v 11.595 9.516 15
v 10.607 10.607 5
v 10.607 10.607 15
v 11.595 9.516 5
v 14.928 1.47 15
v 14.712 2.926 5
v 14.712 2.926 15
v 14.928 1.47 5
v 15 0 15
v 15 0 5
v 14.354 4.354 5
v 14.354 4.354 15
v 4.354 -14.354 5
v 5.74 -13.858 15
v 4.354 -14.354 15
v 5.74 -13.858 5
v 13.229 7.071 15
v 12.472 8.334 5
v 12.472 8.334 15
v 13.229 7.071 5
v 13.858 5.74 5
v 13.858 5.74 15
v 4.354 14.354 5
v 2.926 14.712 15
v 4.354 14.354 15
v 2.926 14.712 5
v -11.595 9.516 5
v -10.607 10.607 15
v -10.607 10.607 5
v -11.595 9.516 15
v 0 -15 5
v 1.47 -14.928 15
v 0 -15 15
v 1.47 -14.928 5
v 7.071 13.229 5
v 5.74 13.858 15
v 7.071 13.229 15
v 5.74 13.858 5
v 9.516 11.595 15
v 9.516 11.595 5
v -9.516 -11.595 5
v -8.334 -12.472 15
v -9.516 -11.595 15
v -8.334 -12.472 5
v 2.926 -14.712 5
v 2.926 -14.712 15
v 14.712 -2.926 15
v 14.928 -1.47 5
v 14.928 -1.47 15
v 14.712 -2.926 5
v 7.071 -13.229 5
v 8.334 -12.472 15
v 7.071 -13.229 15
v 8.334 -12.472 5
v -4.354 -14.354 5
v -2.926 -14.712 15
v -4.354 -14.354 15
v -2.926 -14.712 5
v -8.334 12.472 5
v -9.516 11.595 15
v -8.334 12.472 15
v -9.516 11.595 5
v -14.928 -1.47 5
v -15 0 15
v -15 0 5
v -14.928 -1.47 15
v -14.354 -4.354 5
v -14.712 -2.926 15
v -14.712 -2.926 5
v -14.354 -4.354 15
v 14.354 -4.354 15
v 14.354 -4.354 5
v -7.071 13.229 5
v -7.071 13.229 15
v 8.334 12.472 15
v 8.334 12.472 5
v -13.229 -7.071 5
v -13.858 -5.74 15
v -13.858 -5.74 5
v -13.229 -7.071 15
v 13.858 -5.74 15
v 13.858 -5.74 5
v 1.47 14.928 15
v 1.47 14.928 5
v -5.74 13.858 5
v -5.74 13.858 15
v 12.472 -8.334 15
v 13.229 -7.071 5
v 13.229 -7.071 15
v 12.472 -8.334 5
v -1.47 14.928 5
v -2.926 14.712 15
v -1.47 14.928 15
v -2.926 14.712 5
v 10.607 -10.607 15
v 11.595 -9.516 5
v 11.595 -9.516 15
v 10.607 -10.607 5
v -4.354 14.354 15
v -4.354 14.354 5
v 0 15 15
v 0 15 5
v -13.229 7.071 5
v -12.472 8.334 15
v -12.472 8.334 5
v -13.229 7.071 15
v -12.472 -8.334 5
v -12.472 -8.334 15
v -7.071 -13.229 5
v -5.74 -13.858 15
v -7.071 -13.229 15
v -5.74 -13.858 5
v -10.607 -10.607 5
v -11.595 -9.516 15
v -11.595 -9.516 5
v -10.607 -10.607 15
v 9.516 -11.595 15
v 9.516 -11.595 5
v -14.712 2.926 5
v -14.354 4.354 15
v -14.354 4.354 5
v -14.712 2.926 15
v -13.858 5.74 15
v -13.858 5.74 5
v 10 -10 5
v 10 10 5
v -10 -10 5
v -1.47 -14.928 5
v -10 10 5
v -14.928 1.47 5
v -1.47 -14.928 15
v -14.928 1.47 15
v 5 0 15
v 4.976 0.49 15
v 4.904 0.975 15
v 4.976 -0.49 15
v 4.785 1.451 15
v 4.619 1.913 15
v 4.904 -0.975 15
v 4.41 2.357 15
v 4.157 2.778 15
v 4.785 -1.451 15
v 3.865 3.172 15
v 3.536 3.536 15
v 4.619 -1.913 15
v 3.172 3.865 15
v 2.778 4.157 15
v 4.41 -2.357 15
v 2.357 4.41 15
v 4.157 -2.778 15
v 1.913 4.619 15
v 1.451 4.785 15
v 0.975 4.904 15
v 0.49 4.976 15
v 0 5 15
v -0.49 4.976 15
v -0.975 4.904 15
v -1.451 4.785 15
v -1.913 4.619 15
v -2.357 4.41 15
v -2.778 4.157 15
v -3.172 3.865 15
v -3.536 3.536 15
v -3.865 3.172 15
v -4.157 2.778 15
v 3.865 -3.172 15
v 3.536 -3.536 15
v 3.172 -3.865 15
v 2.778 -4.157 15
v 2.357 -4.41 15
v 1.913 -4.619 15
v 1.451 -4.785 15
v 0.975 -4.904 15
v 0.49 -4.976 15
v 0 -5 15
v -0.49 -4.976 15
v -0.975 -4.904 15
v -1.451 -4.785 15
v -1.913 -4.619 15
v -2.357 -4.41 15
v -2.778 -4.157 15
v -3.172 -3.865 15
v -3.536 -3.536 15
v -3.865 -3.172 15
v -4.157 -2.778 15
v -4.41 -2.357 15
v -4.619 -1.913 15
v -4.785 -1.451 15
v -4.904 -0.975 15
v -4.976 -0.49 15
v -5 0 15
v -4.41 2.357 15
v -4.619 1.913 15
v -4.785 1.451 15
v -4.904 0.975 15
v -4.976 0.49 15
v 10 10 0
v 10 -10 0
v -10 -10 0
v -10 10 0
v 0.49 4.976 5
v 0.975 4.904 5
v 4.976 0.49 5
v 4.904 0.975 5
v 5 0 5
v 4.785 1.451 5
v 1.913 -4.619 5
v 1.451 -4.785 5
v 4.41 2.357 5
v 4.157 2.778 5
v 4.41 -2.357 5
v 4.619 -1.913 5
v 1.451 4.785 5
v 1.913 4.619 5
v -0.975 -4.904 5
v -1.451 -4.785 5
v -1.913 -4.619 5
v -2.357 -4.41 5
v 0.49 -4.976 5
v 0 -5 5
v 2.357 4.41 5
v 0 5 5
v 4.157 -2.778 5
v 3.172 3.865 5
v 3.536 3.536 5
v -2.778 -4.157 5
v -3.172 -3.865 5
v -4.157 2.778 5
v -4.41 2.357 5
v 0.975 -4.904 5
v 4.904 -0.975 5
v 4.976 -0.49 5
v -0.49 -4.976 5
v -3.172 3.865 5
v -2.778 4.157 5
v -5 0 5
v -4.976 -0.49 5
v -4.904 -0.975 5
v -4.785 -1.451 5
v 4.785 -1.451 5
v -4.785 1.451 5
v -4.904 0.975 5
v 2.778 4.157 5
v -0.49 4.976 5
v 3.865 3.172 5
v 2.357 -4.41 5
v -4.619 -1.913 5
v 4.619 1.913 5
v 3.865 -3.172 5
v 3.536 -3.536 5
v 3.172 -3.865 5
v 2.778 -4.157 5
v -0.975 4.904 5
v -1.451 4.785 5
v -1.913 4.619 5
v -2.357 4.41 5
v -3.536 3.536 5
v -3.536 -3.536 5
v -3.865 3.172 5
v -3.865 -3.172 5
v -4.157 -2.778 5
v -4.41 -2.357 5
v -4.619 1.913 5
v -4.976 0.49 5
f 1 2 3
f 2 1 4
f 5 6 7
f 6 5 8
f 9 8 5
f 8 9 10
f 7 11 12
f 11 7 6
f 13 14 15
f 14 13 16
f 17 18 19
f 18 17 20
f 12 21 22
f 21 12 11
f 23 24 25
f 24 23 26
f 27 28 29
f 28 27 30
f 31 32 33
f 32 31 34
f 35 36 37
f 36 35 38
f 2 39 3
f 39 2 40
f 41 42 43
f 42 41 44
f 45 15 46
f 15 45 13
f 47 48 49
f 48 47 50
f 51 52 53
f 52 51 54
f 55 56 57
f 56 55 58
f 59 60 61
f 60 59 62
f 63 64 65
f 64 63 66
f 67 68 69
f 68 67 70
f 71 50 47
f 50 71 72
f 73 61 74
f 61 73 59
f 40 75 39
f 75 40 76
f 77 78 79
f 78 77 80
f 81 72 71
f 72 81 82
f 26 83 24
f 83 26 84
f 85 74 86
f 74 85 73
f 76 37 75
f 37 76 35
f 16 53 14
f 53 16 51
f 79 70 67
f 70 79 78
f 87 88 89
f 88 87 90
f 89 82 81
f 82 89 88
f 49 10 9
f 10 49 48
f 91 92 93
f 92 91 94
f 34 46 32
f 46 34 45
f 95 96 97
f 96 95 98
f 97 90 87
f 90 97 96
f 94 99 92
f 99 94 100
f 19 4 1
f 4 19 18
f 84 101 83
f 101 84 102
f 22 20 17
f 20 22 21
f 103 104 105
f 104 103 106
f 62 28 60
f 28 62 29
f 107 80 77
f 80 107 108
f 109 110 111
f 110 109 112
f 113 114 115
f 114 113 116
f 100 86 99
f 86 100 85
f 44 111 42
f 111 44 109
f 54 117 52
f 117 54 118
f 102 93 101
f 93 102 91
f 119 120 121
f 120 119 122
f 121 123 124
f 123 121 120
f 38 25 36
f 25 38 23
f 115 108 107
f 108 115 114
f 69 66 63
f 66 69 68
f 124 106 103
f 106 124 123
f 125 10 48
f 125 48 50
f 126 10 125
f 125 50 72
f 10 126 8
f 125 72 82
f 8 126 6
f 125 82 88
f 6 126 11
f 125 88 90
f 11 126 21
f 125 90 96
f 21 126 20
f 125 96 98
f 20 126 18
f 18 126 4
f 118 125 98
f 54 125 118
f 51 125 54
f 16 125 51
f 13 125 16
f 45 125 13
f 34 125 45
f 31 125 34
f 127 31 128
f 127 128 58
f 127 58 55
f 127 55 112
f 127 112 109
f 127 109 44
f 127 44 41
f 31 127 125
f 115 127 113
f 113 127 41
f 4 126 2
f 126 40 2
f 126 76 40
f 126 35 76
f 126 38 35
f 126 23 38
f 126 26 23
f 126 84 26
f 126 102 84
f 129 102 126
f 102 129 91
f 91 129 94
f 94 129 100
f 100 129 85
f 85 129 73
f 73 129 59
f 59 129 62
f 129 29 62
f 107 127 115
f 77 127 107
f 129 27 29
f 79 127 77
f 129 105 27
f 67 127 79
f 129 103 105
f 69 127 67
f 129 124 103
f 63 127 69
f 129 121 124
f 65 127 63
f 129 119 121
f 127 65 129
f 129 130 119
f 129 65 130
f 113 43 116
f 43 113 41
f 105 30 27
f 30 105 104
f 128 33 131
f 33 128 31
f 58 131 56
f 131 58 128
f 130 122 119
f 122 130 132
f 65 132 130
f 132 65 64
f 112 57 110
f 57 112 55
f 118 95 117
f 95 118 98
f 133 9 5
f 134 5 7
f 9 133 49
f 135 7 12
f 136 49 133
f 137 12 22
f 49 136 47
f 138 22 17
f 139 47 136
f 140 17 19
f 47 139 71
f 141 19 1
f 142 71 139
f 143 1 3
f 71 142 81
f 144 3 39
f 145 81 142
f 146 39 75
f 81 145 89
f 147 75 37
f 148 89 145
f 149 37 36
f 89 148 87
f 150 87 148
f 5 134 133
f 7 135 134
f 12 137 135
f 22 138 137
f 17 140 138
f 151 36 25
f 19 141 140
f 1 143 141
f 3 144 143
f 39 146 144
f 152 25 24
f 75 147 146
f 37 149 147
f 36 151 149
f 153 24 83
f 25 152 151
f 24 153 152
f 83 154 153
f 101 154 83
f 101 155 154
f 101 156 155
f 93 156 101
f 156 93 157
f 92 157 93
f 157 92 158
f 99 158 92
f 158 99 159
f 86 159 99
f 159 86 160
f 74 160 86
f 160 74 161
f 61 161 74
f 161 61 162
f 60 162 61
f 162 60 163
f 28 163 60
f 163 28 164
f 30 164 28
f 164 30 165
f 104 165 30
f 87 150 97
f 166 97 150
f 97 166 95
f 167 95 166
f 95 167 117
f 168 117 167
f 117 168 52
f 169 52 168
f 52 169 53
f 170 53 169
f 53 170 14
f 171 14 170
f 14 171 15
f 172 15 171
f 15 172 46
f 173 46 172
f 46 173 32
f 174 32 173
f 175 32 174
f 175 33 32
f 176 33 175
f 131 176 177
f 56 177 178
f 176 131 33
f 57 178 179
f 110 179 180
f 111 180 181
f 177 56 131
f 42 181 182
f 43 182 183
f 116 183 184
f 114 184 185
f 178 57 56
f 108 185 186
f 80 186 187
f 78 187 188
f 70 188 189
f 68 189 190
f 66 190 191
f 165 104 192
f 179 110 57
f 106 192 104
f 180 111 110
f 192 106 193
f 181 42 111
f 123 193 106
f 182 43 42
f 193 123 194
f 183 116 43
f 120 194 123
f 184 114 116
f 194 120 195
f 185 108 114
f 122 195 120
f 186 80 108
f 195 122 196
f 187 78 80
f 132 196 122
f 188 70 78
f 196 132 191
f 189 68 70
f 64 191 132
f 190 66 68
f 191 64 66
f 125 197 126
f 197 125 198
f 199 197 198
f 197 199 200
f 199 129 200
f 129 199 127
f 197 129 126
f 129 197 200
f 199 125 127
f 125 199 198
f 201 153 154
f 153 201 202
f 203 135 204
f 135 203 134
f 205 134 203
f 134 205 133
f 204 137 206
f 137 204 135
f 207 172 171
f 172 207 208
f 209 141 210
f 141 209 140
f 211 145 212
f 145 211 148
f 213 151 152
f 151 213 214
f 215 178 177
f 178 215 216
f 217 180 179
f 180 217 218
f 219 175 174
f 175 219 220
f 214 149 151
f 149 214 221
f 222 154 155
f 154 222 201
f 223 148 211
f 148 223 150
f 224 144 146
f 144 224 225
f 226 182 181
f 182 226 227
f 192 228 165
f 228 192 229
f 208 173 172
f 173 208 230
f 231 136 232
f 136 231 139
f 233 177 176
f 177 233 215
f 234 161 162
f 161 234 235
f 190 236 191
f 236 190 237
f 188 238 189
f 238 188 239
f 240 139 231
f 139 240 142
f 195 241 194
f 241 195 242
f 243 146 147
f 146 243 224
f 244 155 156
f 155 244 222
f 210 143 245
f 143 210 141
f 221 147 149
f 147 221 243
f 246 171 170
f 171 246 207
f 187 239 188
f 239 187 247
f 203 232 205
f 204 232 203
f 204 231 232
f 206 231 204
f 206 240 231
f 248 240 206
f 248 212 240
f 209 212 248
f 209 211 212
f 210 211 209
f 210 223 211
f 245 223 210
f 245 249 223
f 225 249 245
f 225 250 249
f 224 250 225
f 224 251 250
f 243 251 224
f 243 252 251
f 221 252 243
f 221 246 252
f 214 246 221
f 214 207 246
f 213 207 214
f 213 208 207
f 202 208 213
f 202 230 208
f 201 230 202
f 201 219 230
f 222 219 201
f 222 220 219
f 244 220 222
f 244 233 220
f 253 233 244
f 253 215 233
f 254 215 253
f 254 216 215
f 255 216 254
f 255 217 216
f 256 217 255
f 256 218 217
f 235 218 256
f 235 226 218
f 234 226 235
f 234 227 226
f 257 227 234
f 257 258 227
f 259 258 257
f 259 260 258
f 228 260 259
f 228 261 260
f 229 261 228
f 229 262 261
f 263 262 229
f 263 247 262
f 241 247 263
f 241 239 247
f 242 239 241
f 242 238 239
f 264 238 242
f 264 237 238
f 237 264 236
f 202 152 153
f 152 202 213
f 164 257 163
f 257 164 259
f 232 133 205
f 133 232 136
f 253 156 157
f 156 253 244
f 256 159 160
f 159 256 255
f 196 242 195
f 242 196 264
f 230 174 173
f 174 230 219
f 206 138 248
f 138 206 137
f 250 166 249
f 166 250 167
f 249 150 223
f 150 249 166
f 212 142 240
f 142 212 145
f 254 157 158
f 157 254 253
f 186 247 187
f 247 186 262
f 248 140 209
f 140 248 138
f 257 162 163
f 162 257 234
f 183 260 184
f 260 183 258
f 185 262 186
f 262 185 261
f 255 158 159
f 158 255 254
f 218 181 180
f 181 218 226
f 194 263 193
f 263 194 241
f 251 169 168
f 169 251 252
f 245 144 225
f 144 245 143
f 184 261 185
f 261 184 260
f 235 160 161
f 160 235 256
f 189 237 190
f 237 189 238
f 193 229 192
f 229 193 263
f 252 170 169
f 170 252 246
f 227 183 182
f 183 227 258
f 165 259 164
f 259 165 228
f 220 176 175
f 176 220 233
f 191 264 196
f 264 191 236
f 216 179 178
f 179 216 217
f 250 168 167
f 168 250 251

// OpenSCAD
module component() {
    difference() {
        union() {
            translate([0, 0, 5])
                cylinder(h=10, r=15, $fn=64);
            translate([-10, -10, 0])
                cube([20, 20, 5]);
        }
        translate([0, 0, 5])
            cylinder(h=10, r=5, $fn=64);
    }
}

component();
